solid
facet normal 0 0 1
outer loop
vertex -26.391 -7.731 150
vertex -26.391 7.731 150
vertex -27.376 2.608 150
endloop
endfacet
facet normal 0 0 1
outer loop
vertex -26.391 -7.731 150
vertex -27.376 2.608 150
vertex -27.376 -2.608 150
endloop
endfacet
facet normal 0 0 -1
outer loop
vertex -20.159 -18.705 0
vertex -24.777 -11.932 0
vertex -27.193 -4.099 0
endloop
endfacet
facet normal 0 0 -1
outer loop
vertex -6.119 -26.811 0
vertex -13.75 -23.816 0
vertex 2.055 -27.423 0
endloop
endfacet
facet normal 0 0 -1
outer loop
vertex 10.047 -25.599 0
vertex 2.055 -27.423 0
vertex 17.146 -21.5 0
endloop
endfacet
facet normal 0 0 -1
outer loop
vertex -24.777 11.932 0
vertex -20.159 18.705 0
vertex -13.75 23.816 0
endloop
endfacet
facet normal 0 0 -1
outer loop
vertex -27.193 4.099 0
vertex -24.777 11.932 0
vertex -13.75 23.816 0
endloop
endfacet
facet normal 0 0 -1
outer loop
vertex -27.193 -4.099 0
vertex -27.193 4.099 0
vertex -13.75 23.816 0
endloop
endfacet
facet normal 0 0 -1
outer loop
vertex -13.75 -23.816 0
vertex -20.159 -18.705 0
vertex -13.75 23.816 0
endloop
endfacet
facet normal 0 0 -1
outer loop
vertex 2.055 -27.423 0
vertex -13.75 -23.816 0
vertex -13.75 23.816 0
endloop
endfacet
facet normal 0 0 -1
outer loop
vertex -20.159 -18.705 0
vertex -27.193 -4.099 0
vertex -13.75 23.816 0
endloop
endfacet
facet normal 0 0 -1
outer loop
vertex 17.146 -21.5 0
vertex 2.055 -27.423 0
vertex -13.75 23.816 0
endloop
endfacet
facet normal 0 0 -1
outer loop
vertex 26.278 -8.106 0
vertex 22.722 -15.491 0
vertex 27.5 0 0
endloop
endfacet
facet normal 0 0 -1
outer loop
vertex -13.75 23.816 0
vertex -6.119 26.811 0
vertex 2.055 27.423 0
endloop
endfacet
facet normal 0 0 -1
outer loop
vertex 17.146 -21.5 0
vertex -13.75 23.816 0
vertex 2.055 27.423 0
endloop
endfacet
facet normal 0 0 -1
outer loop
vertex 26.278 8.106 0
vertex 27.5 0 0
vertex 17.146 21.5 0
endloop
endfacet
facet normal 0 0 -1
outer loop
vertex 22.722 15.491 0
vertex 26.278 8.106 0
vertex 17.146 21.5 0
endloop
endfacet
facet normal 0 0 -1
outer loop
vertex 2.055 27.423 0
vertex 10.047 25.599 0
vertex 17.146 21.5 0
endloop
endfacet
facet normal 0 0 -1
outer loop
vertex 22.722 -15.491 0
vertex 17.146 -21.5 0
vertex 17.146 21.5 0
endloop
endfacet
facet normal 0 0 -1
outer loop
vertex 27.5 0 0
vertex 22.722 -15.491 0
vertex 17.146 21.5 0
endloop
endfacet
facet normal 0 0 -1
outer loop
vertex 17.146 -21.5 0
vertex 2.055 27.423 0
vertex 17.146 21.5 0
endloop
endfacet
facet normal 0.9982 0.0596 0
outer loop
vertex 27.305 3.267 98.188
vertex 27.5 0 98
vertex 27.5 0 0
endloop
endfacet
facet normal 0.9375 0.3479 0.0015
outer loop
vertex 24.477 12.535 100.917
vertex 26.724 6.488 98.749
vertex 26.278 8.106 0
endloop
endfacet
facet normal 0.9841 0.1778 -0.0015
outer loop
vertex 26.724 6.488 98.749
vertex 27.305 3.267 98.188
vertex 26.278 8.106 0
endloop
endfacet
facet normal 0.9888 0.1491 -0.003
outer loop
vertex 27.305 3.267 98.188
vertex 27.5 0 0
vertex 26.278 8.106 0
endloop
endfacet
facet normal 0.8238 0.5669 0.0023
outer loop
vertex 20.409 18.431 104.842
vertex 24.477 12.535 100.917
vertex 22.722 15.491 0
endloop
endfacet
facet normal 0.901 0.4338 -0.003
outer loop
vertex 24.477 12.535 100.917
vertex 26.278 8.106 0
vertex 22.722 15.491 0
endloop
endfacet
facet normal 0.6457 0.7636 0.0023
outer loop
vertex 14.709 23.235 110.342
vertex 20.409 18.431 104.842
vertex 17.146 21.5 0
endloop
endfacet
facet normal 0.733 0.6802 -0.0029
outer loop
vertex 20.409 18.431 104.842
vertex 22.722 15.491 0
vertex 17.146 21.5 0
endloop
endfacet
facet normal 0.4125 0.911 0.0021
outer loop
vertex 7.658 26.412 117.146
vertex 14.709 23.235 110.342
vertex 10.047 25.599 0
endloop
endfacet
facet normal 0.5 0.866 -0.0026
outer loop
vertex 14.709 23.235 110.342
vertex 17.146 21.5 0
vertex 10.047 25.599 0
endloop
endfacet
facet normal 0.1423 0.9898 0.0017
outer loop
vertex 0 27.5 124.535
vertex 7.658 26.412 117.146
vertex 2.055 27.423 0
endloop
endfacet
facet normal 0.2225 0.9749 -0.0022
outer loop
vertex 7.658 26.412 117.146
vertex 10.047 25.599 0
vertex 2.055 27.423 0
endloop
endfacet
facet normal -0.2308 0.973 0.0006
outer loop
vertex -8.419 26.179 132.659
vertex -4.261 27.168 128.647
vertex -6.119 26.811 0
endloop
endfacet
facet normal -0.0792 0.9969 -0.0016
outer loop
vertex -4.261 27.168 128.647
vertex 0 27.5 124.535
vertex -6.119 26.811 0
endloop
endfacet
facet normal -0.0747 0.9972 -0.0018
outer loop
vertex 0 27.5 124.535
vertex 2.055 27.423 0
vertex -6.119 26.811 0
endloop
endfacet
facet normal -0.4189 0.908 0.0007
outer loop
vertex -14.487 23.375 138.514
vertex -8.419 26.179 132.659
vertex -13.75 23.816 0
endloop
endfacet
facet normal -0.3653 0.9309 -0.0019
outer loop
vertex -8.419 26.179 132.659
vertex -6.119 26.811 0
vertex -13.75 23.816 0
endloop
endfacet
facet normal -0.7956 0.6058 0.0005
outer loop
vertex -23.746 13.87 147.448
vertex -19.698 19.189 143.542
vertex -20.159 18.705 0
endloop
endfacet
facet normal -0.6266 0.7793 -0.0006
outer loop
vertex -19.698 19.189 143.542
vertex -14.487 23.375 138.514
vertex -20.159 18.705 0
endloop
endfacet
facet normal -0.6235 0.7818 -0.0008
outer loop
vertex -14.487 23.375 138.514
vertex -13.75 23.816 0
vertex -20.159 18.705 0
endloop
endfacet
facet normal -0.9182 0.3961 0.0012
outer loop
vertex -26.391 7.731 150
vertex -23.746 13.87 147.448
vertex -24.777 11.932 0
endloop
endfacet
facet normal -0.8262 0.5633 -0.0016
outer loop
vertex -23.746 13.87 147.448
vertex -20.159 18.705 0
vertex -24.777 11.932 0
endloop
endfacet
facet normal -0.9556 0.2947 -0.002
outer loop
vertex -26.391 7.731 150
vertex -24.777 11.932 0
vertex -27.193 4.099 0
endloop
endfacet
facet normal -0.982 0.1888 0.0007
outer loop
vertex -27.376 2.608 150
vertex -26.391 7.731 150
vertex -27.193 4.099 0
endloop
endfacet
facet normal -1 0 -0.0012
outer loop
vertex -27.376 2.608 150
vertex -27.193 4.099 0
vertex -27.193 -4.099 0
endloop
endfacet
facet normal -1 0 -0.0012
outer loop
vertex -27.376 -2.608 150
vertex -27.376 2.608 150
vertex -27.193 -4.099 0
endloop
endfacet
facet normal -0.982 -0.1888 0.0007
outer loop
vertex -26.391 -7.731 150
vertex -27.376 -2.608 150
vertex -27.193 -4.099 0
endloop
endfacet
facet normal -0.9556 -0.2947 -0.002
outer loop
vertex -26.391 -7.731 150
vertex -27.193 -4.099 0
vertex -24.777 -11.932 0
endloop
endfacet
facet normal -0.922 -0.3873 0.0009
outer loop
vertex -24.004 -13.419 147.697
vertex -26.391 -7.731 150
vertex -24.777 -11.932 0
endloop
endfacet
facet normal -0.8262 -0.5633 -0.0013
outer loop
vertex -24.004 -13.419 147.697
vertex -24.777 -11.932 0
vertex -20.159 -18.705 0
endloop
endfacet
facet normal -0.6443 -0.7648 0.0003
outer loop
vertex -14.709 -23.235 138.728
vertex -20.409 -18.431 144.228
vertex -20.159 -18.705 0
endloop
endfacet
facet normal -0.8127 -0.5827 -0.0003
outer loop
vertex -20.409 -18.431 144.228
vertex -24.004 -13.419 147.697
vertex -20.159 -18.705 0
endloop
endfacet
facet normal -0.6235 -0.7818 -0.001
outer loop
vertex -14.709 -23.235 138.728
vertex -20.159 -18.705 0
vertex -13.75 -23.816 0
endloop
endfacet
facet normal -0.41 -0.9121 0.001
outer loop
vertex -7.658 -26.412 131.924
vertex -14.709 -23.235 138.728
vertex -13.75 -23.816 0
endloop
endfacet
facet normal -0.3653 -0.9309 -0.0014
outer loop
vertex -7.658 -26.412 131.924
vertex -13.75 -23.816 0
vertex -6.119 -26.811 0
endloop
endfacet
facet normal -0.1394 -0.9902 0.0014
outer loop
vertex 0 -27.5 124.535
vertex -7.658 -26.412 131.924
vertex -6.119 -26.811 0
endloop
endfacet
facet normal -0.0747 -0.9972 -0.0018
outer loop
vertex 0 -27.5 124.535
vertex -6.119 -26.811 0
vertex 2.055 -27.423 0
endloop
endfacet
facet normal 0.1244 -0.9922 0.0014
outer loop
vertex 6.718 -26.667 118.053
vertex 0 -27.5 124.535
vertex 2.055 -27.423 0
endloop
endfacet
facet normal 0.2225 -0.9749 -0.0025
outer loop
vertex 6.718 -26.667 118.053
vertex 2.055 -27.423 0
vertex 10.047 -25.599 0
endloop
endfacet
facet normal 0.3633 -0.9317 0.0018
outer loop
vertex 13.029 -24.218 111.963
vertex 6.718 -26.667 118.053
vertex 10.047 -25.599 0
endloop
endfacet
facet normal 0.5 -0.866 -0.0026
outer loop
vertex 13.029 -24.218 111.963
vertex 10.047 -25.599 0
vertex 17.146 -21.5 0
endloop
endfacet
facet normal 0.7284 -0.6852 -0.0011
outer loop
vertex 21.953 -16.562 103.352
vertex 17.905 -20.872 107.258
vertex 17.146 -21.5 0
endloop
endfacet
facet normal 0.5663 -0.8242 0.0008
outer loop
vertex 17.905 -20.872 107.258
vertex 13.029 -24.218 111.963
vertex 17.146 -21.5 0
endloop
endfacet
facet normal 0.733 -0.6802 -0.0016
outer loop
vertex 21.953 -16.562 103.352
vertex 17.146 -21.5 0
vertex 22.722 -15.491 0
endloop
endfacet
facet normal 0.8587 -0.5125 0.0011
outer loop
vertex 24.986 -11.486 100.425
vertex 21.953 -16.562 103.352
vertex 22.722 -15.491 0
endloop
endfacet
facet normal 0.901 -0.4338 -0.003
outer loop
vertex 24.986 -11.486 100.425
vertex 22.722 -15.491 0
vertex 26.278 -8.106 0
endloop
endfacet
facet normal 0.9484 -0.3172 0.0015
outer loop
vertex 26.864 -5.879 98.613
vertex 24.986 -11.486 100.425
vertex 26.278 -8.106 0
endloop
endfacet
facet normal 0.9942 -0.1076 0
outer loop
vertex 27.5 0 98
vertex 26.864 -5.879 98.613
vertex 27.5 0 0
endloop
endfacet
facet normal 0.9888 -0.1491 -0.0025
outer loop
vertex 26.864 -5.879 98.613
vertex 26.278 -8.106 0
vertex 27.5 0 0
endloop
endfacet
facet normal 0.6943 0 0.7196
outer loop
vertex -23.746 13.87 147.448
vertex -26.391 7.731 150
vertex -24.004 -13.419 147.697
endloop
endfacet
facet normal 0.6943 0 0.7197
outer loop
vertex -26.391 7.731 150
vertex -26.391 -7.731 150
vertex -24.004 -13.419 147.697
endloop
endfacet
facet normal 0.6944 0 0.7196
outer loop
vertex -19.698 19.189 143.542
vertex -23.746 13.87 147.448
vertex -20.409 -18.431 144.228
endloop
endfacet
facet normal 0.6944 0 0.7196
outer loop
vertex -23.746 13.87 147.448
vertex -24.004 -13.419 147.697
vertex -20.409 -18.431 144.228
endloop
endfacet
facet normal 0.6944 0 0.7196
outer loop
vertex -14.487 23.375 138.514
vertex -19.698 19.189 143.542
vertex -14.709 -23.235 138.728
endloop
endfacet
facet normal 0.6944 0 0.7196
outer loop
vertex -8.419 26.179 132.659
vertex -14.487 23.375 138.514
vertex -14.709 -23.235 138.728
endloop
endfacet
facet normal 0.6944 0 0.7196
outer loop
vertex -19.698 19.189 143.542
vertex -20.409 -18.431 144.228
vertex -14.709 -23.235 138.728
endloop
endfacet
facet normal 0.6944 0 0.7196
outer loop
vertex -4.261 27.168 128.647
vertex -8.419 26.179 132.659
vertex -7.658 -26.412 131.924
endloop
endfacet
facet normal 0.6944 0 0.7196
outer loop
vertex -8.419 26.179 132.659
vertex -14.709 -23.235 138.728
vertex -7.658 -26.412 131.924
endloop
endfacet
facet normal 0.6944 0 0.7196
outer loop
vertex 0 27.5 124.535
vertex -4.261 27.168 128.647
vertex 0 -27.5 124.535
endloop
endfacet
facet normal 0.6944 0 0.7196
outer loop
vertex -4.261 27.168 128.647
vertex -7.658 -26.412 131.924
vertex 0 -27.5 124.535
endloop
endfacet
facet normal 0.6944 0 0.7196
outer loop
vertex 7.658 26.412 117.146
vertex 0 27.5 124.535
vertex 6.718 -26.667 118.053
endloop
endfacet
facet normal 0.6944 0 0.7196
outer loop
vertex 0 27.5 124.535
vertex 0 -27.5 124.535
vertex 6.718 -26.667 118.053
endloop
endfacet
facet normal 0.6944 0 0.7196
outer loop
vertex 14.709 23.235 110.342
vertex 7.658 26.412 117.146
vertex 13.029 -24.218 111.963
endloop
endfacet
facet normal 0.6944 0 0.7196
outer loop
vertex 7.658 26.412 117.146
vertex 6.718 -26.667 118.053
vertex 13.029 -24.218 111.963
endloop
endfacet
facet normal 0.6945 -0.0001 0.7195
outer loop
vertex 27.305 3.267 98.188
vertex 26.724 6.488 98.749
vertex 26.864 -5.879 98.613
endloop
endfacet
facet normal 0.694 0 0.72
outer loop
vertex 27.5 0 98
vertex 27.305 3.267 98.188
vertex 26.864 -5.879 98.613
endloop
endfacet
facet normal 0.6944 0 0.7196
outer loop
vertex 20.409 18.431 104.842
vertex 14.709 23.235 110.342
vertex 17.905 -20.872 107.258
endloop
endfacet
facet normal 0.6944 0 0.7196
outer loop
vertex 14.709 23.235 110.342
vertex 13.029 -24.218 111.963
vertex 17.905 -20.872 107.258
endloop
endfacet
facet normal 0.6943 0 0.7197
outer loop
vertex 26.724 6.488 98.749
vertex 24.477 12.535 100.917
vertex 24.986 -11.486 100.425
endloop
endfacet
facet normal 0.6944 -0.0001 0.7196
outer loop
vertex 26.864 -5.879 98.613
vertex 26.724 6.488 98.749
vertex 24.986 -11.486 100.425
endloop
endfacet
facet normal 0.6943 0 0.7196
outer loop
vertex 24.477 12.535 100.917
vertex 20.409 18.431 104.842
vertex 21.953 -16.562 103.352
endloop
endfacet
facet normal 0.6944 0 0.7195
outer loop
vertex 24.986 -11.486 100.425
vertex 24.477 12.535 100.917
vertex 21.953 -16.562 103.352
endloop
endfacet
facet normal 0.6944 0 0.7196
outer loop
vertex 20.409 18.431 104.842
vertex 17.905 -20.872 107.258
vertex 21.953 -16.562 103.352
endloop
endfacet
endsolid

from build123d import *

# Parameters (mm, degrees)
F0_R          = 27.5
F1_DEPTH      = 150
F3_DEPTH      = 27.5
F3_DEPTH_BACK = 27.5


with BuildPart() as f1:
    # F0 (on Top) → F1 (new body)
    with BuildSketch(Plane.XY):
        Circle(F0_R)
    extrude(amount=F1_DEPTH)


with BuildPart() as f3:
    # F2 (on Front) → F3 (new body, two sides)
    with BuildSketch(Plane.XZ) as f3_sk:
        Polygon((27.5, 153), (-29.5, 153), (27.5, 98), align=None)
    extrude(amount=F3_DEPTH)
    extrude(f3_sk.sketch, amount=-F3_DEPTH_BACK)


with BuildPart() as f1_1:
    add(f1.part)

    # F4: cut F3
    add(f3.part, mode=Mode.SUBTRACT)


solid = f1_1.part
